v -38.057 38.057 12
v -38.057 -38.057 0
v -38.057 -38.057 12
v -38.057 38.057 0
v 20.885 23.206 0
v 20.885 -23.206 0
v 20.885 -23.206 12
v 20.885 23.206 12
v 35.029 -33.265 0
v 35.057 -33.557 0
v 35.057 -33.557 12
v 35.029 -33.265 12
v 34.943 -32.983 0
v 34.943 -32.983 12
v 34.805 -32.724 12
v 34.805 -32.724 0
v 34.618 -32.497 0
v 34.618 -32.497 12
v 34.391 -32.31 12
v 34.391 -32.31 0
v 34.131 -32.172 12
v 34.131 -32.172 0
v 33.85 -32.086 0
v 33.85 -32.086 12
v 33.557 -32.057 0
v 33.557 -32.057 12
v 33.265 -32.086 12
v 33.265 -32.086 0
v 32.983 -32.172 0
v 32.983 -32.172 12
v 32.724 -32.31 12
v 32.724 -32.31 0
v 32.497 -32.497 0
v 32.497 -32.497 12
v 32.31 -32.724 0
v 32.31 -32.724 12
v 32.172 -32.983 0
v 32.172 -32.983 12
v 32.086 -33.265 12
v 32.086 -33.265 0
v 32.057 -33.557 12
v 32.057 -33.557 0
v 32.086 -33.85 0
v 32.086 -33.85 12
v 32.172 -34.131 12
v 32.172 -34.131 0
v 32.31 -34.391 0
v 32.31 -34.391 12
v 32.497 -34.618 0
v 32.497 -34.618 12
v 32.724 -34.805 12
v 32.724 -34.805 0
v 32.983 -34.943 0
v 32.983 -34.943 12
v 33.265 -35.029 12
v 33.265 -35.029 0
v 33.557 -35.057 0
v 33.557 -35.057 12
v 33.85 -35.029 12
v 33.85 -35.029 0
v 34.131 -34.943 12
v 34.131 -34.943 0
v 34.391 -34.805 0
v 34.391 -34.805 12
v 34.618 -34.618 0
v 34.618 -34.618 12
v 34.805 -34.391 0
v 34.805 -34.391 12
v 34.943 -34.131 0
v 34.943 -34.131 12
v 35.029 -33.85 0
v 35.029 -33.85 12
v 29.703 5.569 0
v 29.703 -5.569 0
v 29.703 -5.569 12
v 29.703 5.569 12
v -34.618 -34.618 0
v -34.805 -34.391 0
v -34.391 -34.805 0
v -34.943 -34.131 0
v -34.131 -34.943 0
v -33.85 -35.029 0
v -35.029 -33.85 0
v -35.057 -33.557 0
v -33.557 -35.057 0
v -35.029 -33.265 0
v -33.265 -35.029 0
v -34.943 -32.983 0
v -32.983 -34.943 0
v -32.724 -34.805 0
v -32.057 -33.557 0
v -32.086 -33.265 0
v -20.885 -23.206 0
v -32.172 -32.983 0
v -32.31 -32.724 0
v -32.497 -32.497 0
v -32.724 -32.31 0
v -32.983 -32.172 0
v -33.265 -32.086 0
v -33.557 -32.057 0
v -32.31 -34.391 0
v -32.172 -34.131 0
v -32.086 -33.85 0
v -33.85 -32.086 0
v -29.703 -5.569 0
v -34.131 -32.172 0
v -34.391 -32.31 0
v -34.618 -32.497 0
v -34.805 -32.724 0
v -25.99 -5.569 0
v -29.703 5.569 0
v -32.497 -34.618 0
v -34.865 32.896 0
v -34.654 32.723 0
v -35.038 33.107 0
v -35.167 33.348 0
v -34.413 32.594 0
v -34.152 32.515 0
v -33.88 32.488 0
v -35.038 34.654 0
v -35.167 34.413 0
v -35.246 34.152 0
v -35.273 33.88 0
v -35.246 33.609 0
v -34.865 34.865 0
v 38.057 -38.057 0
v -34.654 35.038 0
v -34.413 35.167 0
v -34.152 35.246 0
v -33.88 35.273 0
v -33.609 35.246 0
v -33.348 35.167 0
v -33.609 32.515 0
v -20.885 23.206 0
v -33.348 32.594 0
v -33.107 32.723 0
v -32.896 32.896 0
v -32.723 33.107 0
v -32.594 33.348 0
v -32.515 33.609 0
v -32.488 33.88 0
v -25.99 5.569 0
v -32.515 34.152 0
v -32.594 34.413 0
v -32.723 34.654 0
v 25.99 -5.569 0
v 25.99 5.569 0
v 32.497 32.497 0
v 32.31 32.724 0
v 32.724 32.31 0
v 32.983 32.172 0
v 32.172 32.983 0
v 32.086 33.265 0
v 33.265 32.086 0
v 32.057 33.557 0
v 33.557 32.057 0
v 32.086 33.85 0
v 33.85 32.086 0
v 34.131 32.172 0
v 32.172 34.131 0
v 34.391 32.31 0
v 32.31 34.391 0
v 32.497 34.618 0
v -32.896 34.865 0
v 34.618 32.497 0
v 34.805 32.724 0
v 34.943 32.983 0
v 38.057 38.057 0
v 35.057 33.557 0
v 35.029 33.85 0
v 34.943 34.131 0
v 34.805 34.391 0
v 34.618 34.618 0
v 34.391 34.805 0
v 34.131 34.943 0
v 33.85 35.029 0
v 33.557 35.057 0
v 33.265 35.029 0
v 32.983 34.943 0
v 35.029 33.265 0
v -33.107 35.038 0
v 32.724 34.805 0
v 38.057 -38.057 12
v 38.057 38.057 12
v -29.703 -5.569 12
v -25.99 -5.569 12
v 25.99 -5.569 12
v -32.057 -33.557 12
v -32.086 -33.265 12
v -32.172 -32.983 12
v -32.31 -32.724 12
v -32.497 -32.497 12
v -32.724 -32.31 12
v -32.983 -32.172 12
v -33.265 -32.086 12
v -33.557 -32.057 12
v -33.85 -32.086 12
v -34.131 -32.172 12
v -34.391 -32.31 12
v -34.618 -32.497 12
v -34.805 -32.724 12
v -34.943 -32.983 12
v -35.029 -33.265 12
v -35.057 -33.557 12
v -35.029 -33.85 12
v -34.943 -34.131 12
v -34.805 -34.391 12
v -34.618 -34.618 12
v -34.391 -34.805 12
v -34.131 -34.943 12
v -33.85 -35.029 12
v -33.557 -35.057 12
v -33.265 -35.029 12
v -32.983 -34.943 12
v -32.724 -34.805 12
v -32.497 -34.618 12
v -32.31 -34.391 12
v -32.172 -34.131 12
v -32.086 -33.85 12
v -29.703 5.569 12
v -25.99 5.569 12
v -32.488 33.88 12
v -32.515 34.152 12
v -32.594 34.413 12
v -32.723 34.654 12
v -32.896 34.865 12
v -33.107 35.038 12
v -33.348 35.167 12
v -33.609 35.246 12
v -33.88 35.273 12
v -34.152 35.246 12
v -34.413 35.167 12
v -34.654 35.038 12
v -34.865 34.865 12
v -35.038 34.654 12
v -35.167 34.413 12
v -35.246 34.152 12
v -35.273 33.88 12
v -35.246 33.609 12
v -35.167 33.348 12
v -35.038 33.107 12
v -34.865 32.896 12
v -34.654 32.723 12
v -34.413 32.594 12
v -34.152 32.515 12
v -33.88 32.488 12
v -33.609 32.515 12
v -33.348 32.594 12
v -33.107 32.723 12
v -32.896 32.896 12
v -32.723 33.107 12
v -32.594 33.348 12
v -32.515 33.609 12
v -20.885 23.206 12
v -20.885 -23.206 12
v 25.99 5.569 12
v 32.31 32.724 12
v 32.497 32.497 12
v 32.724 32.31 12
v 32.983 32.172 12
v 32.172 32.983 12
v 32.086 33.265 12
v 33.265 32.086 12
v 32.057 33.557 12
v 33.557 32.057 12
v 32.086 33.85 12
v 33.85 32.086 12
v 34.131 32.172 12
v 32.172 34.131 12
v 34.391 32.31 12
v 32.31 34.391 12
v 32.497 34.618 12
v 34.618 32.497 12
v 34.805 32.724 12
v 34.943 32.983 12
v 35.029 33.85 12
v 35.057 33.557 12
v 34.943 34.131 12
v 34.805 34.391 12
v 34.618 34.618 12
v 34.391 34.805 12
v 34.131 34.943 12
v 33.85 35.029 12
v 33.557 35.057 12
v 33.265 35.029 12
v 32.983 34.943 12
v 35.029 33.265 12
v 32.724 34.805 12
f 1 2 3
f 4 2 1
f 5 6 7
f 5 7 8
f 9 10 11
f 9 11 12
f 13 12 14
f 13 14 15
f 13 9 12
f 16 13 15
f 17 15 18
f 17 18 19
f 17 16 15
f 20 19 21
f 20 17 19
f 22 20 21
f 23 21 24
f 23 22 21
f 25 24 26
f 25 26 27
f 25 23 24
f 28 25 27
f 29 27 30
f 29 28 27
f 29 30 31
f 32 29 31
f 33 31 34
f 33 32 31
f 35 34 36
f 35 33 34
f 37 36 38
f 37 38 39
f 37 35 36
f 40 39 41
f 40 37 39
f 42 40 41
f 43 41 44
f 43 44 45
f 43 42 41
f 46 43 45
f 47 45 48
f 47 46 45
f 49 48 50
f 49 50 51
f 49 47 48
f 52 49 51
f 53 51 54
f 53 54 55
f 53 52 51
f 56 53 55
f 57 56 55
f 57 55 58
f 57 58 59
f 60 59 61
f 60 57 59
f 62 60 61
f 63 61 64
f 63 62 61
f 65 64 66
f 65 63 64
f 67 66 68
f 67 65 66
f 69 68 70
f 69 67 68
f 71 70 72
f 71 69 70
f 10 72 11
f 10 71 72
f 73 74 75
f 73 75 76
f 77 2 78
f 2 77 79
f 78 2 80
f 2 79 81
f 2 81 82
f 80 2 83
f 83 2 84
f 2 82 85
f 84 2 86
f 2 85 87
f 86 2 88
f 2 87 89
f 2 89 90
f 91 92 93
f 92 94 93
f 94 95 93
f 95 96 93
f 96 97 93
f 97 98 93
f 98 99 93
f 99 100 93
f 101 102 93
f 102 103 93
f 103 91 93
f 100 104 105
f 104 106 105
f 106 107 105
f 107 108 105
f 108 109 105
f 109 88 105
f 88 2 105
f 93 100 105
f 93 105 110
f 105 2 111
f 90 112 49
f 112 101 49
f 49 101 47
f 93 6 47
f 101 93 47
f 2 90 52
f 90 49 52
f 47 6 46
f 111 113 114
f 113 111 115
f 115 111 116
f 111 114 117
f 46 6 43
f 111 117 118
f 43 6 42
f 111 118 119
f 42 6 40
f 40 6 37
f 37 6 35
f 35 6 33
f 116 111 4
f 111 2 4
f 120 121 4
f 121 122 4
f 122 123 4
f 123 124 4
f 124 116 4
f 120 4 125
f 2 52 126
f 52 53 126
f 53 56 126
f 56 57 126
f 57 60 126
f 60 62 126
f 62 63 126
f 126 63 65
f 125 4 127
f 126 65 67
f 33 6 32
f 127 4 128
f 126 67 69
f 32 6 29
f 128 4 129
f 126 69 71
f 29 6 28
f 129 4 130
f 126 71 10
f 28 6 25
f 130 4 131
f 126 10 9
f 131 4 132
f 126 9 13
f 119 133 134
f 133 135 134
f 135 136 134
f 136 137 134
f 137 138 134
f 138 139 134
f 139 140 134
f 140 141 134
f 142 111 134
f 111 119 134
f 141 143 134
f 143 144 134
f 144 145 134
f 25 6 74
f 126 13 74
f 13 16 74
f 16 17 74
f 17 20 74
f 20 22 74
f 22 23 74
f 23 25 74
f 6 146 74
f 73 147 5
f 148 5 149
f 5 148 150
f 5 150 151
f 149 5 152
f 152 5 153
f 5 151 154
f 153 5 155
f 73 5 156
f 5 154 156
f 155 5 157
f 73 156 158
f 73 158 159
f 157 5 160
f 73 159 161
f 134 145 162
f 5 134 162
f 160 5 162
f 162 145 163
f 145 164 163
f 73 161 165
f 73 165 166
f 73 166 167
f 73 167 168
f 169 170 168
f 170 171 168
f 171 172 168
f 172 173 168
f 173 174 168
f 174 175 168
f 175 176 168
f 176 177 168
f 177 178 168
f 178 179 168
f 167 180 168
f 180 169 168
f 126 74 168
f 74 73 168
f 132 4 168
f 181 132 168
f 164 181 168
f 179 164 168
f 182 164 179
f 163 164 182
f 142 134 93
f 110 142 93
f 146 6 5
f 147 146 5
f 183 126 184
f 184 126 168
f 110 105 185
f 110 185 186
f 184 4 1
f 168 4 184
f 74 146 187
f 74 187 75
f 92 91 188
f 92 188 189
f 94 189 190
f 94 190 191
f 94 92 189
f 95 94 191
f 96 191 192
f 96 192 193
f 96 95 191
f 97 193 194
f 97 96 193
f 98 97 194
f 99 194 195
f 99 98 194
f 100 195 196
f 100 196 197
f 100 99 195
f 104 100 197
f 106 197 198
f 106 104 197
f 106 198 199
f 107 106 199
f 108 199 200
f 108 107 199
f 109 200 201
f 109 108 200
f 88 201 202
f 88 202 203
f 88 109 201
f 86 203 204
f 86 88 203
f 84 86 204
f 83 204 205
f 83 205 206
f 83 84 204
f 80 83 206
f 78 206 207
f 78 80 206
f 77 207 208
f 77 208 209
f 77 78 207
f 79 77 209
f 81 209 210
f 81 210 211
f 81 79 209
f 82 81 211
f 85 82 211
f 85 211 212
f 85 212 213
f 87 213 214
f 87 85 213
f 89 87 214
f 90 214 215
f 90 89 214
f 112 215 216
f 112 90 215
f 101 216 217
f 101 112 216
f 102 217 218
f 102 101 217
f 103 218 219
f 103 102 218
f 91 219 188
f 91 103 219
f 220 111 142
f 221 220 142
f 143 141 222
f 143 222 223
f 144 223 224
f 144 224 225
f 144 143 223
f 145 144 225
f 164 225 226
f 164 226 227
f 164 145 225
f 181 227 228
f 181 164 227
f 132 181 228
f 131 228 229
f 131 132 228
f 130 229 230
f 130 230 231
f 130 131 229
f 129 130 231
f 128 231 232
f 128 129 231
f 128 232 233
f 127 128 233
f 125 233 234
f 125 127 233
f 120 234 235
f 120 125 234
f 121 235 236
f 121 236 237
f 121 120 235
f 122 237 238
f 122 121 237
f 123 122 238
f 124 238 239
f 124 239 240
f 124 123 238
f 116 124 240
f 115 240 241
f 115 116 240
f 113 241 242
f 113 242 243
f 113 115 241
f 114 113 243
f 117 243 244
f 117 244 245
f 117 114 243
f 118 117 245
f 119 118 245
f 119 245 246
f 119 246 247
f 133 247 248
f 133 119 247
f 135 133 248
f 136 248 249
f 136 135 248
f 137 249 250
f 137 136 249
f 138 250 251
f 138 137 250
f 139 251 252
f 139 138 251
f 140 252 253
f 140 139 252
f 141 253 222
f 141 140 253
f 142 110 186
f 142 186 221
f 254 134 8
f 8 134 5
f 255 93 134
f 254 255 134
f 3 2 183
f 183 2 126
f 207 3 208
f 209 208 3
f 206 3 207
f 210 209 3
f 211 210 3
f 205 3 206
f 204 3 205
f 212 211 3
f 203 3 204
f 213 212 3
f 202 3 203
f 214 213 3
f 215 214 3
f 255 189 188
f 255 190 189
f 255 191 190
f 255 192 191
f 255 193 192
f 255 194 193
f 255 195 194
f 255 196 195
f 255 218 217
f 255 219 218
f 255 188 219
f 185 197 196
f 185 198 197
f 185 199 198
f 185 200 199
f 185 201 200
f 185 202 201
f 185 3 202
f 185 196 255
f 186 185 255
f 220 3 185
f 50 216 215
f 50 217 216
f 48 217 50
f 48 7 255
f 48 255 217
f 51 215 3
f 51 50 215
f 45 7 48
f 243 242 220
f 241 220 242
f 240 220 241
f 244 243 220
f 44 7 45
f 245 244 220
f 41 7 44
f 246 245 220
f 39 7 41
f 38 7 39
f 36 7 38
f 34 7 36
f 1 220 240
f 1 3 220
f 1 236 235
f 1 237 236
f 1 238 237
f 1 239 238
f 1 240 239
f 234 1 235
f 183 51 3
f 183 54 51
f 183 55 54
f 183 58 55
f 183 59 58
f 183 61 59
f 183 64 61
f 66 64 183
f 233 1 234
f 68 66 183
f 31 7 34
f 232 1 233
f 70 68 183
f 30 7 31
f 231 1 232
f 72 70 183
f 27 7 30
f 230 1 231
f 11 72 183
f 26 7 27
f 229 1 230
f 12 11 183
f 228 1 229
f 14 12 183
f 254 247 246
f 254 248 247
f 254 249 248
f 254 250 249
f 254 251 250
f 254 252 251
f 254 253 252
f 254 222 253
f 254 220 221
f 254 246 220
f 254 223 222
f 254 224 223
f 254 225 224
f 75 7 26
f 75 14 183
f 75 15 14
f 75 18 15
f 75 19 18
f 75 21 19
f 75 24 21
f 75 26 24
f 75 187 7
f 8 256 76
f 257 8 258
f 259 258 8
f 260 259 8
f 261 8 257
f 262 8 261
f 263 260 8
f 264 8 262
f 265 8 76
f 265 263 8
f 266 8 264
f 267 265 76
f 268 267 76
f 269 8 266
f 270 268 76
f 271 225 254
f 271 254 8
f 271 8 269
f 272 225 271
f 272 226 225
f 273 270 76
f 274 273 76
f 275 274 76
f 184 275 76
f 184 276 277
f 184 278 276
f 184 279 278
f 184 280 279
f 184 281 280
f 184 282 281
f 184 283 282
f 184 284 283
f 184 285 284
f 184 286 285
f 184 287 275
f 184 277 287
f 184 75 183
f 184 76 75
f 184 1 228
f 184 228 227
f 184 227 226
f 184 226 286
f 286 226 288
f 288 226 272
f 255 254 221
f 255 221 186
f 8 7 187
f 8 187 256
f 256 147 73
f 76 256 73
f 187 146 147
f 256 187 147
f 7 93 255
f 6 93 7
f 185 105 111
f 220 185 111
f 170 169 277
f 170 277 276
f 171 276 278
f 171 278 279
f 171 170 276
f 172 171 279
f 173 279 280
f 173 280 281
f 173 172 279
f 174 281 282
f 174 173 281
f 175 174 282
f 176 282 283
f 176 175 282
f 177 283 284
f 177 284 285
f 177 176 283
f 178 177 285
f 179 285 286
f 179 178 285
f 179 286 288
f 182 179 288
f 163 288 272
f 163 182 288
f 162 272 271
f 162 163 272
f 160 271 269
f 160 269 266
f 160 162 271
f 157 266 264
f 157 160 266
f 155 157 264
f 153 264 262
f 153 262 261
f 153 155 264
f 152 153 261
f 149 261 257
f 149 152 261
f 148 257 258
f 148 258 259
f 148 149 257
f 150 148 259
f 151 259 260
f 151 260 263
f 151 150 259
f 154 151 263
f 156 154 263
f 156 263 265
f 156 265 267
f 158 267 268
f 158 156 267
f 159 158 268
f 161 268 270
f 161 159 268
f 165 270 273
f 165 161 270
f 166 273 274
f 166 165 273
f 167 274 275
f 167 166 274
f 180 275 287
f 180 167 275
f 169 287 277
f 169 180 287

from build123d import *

# Parameters (mm, degrees)
F0_W     = 76.114866
F0_H     = 76.114866
F0_R     = 1.5
F0_W_2   = 3.712921
F0_H_2   = 11.138762
F0_W_3   = 41.770354
F0_H_3   = 46.411504
F0_R_2   = 1.392345
F1_DEPTH = 12


with BuildPart() as f1:
    # F0 (on Top) → F1 (new body)
    with BuildSketch(Plane.XY):
        Rectangle(F0_W, F0_H)
        with Locations((-33.557433, -33.557433)):
            Circle(F0_R, mode=Mode.SUBTRACT)
        with Locations((33.557433, -33.557433)):
            Circle(F0_R, mode=Mode.SUBTRACT)
        with Locations((-27.846902, 0)):
            Rectangle(F0_W_2, F0_H_2, mode=Mode.SUBTRACT)
        Rectangle(F0_W_3, F0_H_3, mode=Mode.SUBTRACT)
        with Locations((-33.880398, 33.880398)):
            Circle(F0_R_2, mode=Mode.SUBTRACT)
        with Locations((27.846902, 0)):
            Rectangle(F0_W_2, F0_H_2, mode=Mode.SUBTRACT)
        with Locations((33.557433, 33.557433)):
            Circle(F0_R, mode=Mode.SUBTRACT)
    extrude(amount=F1_DEPTH)


solid = f1.part
